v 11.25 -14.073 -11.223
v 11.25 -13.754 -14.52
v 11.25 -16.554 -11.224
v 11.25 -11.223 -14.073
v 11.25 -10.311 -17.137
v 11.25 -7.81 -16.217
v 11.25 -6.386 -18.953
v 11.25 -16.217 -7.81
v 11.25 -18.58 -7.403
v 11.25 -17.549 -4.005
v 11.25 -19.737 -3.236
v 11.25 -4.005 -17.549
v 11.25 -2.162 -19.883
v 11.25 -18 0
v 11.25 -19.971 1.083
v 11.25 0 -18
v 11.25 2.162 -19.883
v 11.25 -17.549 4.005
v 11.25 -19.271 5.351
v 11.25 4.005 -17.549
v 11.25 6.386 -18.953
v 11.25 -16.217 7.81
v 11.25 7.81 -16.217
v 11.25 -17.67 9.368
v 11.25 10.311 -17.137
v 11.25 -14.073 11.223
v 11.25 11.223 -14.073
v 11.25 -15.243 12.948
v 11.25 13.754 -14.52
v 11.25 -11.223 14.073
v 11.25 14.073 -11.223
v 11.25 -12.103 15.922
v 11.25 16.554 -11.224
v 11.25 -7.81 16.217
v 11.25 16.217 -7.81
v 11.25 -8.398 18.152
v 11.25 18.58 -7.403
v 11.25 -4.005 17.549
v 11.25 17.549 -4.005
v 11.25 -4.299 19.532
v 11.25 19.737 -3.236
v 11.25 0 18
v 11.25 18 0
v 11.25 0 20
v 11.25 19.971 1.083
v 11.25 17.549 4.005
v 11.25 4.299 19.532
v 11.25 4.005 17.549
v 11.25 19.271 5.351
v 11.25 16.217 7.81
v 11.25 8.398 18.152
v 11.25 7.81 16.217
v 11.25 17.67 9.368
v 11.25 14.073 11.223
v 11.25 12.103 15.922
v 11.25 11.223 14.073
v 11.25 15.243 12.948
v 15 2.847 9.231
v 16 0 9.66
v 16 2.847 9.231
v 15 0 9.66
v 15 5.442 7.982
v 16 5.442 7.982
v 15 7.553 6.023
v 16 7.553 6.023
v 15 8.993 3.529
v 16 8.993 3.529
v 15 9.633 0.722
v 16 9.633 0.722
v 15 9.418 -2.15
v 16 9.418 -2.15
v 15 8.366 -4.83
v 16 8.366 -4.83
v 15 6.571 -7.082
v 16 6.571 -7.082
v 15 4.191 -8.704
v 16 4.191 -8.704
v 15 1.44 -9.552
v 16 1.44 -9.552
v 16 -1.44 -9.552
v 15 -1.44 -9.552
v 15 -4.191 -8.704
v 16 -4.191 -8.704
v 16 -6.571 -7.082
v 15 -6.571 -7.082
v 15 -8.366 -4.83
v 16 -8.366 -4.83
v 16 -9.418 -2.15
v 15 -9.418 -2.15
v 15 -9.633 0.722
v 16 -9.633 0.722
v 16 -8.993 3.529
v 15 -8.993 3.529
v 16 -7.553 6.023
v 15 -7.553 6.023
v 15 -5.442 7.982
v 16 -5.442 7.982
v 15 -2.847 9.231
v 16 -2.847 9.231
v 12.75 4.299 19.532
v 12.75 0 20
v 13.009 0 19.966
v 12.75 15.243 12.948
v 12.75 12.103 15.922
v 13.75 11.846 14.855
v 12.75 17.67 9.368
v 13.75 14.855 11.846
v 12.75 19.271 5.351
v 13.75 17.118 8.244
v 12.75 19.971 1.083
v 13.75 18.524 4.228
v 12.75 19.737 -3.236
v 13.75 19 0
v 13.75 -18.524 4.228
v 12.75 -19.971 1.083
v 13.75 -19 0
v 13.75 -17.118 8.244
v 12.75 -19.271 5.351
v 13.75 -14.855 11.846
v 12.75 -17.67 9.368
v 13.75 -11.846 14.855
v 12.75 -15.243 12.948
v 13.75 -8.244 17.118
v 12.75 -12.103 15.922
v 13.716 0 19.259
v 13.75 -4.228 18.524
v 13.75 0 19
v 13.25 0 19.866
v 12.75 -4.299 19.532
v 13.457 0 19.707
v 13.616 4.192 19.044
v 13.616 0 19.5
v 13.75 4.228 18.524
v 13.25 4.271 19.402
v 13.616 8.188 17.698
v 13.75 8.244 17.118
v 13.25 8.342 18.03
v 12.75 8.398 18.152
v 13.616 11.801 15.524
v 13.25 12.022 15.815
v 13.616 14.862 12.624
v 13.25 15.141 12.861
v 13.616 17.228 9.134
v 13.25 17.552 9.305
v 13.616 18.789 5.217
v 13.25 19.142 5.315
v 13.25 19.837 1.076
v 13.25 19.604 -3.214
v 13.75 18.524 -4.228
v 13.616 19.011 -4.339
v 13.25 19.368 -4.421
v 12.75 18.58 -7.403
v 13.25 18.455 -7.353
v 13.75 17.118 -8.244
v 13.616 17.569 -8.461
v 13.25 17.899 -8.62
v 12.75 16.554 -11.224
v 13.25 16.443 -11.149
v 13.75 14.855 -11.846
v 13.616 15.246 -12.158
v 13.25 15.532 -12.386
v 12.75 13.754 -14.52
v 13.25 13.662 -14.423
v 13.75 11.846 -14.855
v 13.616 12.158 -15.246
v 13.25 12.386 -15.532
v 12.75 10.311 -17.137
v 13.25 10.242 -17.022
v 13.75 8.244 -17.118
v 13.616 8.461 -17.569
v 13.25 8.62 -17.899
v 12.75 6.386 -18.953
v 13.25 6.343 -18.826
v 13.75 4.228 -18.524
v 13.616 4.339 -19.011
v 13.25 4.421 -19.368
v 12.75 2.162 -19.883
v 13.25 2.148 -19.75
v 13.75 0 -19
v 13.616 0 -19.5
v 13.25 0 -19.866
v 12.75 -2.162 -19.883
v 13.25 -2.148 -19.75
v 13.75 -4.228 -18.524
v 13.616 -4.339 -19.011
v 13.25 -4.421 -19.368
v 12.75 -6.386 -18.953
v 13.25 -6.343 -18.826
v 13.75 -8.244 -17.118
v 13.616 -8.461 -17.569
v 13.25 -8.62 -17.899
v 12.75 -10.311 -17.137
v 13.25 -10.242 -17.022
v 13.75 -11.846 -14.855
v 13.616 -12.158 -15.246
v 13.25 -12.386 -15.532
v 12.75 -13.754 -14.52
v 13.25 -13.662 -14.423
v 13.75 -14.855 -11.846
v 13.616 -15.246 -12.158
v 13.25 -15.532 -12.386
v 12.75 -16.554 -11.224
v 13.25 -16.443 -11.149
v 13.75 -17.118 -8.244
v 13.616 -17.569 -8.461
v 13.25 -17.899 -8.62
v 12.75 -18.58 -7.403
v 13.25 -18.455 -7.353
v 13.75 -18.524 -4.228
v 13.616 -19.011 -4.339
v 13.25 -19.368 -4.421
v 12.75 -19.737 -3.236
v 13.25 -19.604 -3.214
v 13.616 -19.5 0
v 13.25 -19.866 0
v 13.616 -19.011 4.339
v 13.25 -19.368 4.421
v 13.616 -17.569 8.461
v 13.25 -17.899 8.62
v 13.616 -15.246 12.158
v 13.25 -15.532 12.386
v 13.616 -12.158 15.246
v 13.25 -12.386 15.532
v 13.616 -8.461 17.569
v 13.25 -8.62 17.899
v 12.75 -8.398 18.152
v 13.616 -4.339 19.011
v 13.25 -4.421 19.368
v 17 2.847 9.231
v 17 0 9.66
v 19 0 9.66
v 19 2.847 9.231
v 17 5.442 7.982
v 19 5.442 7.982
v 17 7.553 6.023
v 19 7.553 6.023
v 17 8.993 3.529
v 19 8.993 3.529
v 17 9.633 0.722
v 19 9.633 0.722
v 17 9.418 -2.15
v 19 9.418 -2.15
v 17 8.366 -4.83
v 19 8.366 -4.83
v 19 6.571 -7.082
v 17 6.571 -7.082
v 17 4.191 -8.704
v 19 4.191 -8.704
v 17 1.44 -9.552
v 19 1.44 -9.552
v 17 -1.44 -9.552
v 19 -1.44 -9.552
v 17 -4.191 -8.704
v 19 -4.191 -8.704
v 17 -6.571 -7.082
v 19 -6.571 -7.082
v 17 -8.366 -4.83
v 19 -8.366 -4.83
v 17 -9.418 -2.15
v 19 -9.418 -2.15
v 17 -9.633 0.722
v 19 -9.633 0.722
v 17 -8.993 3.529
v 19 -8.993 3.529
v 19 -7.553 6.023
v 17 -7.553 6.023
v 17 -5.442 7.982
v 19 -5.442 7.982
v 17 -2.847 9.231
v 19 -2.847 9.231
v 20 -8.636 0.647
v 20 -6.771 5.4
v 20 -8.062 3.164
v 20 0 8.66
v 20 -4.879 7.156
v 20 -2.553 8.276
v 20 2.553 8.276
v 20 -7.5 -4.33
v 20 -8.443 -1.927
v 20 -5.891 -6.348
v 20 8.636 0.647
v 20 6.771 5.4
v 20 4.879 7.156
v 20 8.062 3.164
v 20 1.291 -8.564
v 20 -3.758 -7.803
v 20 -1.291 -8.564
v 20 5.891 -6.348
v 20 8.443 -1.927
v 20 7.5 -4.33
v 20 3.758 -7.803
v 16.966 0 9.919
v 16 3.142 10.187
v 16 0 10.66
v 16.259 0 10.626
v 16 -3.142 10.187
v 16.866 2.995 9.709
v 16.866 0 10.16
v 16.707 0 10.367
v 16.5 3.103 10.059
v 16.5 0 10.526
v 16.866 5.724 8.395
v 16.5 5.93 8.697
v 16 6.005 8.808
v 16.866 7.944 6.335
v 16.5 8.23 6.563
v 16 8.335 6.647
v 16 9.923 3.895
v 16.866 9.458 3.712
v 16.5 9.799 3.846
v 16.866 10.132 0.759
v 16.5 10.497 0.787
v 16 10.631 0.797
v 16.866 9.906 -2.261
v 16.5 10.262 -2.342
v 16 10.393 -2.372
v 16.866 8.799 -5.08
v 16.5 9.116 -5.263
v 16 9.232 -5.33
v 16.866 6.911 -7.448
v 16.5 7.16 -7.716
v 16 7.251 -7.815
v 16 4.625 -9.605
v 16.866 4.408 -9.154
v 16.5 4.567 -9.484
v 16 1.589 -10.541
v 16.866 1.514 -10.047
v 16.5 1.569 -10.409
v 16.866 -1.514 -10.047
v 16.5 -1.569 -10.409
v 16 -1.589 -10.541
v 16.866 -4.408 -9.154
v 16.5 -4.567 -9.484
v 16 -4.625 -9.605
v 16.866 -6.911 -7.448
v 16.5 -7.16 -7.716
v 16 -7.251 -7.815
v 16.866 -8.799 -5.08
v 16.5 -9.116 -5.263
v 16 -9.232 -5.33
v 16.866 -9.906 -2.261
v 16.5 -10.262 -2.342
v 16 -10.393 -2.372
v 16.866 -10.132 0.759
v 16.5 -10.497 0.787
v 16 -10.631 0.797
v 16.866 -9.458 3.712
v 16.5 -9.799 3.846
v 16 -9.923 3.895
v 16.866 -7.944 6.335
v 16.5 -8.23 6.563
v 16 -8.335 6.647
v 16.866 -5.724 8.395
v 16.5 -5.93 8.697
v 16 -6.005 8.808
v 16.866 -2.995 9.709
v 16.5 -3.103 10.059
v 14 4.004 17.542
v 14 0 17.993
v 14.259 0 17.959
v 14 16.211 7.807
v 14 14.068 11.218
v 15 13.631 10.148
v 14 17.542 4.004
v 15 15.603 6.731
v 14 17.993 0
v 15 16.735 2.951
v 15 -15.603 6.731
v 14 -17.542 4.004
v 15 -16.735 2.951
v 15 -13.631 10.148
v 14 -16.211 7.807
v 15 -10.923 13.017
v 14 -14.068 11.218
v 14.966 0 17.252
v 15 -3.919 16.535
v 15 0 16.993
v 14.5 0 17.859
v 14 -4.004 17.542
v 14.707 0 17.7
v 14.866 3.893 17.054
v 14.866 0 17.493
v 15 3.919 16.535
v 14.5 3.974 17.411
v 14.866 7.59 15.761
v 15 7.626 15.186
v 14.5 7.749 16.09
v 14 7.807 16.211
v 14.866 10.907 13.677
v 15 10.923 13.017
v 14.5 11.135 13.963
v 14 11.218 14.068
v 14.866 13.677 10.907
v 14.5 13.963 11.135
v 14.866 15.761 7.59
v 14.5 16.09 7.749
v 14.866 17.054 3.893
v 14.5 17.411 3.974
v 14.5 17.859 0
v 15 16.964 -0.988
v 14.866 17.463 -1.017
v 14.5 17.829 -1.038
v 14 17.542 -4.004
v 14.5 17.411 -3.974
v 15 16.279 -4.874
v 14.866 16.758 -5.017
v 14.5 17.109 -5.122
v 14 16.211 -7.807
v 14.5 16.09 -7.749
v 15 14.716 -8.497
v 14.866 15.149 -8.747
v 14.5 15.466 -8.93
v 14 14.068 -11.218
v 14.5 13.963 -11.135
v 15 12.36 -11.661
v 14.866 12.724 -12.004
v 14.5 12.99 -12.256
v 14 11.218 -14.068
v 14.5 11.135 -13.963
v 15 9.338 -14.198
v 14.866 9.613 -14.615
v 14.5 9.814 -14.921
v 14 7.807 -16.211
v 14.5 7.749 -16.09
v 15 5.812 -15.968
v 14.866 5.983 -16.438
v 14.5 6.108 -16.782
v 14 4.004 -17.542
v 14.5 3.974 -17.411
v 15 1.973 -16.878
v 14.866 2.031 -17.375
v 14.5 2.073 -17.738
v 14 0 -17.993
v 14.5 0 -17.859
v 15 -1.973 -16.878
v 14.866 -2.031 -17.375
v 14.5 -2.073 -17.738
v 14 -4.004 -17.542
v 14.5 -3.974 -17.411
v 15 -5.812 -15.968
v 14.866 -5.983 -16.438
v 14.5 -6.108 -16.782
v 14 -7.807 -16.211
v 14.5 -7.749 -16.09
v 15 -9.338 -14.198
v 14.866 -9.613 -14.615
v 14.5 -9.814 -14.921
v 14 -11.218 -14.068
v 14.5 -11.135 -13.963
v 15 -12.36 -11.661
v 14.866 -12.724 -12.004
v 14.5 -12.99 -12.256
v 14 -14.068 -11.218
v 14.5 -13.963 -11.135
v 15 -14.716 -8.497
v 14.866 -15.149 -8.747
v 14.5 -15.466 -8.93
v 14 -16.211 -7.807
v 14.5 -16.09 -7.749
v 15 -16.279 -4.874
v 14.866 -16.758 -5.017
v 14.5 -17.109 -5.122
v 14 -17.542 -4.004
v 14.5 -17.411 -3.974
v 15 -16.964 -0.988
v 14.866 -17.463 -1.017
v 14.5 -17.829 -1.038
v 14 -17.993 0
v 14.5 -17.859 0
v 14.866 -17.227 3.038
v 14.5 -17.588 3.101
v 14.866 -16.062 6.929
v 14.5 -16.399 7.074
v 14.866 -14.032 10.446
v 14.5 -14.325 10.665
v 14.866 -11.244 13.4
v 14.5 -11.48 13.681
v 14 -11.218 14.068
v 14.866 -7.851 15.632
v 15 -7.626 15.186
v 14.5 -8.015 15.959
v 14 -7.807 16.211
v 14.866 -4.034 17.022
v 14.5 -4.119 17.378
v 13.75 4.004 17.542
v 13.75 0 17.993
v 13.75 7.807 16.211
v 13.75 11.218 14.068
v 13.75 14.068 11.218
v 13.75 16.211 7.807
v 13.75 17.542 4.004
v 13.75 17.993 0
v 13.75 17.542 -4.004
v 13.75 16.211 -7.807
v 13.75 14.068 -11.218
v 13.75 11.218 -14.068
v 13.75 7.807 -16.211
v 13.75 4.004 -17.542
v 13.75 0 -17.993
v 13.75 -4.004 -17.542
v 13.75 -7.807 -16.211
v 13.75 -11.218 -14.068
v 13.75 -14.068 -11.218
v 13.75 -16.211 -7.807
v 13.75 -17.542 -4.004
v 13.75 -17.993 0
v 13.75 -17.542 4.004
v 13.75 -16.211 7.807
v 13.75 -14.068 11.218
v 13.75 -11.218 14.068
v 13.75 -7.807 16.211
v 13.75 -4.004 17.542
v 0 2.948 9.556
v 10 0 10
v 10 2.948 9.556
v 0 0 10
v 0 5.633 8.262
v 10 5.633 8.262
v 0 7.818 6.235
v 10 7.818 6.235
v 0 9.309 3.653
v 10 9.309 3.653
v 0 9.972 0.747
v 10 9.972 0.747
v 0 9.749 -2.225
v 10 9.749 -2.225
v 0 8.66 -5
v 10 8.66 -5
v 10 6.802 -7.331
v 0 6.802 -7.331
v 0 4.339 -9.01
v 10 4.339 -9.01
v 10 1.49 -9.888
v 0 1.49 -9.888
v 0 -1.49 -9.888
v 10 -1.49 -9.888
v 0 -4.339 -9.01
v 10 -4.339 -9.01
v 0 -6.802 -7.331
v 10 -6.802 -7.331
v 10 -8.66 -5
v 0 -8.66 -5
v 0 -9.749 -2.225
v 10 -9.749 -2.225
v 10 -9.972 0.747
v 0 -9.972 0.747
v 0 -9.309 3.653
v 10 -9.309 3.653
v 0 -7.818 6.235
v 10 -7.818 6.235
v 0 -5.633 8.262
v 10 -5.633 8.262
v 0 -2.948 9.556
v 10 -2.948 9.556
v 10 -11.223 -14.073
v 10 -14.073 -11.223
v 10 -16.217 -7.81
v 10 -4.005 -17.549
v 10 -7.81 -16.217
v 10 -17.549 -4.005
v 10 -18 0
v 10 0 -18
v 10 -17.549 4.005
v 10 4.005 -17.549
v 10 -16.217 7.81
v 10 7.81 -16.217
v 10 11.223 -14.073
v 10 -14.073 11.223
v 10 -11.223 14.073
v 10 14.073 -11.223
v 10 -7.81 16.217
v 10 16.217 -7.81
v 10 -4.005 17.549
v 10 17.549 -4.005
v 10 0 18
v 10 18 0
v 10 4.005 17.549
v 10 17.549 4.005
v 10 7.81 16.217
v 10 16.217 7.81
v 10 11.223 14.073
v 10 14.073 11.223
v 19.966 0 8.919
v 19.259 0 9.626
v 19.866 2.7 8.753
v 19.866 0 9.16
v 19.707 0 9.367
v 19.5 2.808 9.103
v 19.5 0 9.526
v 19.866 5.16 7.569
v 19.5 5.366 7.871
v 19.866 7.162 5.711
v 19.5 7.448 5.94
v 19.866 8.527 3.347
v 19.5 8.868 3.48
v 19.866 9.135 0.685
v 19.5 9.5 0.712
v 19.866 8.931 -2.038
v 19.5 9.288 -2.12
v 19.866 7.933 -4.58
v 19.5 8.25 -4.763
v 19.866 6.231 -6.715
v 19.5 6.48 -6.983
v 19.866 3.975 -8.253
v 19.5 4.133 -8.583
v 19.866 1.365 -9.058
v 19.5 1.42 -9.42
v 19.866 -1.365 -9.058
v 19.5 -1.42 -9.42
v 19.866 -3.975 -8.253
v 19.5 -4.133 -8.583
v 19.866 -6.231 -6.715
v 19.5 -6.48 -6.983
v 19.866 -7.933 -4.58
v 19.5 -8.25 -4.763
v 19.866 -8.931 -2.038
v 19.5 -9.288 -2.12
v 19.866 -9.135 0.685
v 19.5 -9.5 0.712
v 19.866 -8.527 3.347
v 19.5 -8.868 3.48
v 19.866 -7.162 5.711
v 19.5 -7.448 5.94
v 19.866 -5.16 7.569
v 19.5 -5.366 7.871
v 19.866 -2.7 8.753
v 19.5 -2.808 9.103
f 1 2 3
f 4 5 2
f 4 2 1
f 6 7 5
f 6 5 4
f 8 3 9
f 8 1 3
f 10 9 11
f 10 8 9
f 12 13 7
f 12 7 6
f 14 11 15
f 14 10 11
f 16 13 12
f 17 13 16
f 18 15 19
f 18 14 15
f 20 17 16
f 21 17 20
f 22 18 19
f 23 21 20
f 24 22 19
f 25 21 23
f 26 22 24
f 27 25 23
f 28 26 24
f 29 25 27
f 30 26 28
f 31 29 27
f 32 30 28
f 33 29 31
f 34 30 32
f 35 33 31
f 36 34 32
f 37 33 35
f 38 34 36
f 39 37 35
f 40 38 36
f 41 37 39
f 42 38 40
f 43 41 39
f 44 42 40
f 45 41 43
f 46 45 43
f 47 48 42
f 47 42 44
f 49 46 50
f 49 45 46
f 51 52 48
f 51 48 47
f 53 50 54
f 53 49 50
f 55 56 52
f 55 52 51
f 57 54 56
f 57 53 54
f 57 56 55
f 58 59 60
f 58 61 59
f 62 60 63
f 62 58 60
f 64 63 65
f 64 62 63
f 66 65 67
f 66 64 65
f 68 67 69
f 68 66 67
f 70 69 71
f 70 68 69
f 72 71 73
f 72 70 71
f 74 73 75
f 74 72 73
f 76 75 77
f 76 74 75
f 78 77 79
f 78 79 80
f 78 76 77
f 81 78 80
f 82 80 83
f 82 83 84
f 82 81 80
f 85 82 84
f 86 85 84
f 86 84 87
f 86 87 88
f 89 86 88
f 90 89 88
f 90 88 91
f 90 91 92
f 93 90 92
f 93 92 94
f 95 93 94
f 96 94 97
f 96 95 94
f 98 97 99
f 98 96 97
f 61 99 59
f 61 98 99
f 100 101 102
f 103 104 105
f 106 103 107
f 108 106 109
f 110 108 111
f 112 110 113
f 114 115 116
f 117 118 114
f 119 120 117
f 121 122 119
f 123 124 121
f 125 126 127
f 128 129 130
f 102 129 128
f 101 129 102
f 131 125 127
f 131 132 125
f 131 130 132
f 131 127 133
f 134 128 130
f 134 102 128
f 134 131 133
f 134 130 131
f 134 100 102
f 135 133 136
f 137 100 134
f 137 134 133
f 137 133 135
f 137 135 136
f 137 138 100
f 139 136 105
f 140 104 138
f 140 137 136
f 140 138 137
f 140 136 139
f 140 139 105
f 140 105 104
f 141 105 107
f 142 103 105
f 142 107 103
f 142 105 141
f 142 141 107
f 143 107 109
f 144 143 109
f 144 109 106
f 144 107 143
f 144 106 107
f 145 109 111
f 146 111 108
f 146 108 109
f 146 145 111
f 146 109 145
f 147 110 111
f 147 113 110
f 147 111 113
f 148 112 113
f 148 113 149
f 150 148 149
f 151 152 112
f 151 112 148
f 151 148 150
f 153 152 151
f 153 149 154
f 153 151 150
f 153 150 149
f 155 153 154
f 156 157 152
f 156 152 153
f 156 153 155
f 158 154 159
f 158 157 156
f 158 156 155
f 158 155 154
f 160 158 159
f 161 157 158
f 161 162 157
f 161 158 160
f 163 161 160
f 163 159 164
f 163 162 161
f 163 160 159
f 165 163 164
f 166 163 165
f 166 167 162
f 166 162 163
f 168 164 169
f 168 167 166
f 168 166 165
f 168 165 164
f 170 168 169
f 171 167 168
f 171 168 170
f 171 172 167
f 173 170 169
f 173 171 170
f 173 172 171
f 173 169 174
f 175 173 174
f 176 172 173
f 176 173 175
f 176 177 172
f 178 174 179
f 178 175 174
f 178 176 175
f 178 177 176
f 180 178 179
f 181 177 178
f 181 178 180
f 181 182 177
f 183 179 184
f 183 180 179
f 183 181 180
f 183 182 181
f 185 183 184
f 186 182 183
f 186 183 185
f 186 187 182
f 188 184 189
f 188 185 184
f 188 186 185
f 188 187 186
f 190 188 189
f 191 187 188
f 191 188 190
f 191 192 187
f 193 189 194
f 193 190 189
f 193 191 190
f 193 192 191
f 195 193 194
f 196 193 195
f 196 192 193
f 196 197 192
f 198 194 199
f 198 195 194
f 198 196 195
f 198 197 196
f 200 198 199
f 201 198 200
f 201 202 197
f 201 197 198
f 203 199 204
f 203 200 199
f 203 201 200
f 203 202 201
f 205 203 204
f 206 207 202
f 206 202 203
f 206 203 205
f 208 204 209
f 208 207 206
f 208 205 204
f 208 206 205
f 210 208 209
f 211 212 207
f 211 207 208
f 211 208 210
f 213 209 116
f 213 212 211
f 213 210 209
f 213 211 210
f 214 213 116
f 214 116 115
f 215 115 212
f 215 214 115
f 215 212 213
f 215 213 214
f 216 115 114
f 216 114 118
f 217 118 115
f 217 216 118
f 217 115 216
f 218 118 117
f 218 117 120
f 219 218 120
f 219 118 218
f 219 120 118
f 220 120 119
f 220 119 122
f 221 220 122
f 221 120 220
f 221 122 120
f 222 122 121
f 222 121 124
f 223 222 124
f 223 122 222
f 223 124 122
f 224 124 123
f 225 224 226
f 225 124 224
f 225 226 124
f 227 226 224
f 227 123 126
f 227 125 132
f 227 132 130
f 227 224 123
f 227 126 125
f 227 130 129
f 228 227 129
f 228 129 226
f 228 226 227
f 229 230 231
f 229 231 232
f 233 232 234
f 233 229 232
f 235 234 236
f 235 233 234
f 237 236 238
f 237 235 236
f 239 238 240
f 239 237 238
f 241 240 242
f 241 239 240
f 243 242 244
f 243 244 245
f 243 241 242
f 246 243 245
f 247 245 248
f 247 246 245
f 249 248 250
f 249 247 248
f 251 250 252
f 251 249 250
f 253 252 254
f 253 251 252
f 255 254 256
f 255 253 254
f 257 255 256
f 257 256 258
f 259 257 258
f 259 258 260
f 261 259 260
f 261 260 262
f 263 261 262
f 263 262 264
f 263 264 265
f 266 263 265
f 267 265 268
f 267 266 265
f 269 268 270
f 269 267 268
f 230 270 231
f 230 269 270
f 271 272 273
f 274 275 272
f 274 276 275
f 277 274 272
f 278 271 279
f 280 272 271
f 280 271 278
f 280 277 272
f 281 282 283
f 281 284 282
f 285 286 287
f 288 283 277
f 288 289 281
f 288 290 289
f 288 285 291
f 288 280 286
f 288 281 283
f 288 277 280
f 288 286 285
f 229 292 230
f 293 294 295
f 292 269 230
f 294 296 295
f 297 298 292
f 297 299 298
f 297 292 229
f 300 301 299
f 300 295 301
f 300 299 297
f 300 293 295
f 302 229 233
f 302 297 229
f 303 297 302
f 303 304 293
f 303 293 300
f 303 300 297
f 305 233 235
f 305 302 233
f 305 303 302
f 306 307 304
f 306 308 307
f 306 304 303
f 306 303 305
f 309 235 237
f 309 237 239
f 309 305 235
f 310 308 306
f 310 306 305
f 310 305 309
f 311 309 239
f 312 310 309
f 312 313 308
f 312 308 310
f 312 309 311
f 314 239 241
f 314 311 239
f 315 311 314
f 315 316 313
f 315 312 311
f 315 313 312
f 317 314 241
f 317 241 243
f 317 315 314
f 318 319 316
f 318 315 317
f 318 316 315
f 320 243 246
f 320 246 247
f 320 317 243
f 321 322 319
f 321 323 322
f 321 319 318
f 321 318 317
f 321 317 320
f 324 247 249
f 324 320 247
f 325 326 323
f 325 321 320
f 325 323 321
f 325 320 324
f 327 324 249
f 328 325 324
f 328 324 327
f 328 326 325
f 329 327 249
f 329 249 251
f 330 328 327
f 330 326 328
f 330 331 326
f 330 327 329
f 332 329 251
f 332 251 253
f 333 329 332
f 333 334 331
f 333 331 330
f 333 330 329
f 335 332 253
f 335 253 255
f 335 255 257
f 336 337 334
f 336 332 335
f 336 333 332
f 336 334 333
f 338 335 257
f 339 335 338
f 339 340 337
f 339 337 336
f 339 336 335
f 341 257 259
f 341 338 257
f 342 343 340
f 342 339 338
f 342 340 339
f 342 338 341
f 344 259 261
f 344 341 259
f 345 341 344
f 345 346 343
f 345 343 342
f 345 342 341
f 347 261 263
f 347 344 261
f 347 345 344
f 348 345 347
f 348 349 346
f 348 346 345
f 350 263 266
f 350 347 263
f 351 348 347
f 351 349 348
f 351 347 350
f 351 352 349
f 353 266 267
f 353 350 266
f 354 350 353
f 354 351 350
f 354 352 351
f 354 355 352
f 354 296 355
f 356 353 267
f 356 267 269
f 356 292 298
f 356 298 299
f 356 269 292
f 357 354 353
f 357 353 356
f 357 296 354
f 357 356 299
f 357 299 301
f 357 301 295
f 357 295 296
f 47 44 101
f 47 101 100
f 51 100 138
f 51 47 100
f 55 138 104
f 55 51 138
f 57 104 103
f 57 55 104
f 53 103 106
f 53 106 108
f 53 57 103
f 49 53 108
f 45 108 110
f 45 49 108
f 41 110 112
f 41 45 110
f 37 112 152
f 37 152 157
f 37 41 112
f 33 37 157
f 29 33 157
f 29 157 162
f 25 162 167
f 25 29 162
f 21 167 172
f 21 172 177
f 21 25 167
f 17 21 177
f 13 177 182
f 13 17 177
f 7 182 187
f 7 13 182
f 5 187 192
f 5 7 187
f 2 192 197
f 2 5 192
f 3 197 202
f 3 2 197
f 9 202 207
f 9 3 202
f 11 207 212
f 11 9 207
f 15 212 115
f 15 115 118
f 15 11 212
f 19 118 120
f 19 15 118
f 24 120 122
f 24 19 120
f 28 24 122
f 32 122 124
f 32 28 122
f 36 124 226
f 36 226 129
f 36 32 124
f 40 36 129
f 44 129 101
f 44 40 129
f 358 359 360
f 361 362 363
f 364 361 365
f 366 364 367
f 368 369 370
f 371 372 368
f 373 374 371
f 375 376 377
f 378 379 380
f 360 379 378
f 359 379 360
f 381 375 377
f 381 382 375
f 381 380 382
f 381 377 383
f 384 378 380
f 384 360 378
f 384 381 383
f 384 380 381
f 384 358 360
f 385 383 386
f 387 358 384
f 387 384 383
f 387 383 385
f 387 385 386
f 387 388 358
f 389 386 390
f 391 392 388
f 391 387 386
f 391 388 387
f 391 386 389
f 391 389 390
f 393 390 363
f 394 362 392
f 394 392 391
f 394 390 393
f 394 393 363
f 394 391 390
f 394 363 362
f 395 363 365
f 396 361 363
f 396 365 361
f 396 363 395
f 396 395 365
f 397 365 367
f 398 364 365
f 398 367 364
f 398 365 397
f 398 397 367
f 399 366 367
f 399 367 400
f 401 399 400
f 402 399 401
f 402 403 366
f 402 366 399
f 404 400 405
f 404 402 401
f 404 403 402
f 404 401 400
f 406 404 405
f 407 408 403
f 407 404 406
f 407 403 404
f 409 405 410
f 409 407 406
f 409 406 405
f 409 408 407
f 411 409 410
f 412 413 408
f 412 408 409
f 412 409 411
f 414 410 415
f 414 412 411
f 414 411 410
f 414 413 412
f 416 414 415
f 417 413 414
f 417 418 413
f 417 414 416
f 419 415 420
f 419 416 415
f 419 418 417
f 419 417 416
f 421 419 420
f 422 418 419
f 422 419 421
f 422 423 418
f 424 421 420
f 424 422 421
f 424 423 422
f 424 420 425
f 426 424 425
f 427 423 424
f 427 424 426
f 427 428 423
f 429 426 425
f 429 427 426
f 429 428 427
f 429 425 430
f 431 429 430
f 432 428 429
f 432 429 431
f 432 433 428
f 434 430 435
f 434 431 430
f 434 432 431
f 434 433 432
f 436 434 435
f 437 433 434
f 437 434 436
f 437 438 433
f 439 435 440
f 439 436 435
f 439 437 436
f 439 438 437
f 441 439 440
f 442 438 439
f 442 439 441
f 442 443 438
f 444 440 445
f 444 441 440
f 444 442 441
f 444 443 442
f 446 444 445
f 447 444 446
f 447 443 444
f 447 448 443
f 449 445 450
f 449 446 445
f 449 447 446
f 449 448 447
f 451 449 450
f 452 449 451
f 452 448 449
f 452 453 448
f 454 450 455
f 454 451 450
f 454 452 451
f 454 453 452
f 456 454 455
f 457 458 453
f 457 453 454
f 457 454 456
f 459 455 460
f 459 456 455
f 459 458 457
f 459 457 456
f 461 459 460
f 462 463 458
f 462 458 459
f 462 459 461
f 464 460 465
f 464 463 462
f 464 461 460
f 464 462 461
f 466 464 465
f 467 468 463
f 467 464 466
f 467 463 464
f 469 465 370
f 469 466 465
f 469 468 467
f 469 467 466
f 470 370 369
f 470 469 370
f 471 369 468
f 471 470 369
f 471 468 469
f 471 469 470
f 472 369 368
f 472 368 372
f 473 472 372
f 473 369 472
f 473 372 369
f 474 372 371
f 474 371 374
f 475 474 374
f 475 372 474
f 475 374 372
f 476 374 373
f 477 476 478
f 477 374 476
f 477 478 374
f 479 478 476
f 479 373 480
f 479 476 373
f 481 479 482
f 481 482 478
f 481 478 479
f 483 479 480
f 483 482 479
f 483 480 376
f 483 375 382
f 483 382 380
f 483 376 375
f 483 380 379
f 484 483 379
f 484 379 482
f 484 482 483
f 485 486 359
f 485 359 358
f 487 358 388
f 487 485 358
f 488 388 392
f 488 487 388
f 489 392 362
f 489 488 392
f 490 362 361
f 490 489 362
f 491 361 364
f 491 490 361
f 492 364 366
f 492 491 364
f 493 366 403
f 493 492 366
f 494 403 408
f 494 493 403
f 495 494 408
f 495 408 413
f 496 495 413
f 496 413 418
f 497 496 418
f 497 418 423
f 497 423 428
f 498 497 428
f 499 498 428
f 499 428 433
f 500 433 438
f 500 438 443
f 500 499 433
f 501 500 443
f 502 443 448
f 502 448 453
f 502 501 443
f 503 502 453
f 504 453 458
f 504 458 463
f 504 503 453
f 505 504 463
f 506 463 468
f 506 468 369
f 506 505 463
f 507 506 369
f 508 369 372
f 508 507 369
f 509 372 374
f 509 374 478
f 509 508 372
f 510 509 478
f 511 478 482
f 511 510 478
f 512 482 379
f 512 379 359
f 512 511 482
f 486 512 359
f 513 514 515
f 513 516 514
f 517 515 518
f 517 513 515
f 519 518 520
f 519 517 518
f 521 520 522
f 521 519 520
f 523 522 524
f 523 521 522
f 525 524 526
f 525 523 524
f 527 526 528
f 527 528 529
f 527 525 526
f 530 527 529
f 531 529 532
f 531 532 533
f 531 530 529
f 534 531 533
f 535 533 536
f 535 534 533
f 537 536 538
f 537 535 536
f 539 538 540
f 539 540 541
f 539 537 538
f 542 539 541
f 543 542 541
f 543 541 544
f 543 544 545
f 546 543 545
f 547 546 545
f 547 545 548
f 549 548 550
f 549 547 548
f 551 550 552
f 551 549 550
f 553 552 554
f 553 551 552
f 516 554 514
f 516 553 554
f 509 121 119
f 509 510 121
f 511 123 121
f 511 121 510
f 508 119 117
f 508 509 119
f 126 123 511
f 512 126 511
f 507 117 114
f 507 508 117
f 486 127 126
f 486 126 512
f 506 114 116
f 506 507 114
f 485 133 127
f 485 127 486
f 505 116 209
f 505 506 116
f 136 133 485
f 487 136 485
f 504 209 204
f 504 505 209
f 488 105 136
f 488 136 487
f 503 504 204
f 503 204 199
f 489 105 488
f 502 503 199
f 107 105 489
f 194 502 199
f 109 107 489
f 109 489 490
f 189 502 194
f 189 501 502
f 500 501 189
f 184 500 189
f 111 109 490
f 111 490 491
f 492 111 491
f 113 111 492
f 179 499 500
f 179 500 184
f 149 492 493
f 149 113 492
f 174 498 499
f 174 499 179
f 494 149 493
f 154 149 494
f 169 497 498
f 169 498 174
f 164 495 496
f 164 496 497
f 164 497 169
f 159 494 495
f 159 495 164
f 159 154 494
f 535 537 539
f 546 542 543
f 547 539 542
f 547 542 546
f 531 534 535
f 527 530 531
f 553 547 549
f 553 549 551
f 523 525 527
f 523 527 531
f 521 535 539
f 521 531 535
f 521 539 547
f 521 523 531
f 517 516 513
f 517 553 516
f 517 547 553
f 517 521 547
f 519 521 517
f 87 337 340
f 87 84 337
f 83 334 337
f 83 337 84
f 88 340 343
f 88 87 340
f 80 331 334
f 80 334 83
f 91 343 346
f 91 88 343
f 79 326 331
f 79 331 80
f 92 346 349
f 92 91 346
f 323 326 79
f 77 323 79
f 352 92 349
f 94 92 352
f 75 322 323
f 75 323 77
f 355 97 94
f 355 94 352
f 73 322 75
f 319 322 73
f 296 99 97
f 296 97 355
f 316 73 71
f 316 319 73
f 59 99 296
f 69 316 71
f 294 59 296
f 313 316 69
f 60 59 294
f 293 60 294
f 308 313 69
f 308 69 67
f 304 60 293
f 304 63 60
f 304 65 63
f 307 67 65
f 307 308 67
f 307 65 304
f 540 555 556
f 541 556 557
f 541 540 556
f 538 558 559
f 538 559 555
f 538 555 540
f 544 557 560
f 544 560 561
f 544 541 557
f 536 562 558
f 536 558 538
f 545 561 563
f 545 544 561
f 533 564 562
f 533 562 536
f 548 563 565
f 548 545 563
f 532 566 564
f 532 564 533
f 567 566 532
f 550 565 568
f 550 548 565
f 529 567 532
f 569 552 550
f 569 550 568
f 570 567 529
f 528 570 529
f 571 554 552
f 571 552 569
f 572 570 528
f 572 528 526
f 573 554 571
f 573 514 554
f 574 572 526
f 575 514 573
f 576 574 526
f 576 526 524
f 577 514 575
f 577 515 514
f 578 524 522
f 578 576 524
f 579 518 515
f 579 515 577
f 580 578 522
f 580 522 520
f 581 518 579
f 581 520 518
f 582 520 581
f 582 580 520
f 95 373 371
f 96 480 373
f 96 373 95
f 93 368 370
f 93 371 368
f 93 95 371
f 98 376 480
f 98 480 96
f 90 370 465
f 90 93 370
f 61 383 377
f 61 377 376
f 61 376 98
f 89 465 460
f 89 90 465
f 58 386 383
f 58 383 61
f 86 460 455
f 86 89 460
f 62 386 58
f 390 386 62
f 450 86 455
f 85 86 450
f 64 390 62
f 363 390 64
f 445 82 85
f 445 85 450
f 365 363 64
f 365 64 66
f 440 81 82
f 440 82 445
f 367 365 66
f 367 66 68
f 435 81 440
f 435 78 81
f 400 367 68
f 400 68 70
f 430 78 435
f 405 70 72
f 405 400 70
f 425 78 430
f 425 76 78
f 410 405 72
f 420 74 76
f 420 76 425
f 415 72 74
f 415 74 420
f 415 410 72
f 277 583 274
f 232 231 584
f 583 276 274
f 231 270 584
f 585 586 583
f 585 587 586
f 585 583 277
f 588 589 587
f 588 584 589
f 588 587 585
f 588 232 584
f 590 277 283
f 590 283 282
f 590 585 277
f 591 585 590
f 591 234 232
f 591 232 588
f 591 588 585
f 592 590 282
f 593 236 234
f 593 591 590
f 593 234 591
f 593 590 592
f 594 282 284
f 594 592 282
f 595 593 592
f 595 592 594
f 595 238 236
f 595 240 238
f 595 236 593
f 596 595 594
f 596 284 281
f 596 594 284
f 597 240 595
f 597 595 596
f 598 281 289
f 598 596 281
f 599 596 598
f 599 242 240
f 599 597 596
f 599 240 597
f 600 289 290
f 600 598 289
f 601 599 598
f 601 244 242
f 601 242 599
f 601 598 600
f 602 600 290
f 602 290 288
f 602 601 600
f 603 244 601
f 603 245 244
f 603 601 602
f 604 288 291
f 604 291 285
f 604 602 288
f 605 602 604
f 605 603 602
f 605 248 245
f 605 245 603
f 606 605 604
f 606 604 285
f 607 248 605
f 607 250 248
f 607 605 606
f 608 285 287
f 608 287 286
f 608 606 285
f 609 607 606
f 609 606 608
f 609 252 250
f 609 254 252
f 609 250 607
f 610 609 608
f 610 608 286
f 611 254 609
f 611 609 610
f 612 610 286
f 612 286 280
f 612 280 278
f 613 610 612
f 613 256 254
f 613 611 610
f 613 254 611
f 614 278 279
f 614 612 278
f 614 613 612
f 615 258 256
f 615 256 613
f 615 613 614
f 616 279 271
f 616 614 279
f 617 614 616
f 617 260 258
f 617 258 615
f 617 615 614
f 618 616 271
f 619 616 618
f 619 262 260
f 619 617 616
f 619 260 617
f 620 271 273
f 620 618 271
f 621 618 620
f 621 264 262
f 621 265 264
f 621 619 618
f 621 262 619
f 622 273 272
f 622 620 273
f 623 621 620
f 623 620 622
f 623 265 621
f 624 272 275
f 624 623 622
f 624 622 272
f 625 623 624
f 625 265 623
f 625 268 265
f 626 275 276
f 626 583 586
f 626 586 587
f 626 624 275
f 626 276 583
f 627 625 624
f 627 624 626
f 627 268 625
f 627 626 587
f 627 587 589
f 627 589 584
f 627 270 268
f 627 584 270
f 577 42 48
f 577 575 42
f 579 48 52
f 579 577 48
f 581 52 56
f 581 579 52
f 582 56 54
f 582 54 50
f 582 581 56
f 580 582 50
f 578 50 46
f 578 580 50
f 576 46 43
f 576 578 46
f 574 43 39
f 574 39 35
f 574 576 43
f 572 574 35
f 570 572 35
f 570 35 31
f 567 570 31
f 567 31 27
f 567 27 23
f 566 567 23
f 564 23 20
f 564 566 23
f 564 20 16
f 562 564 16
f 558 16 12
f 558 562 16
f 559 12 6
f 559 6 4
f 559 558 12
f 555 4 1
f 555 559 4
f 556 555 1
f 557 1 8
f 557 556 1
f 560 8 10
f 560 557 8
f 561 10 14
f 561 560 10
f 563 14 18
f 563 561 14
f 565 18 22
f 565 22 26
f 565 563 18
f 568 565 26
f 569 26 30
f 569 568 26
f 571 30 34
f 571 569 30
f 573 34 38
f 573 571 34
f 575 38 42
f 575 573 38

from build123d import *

# Parameters (mm, degrees)
F2_R = 0.99999


# Not quite as in the source:
# - a fillet or chamfer is up to 0.001 mm smaller than in the source, because OpenCascade refuses the exact size


with BuildPart() as f1:
    # F0 (on Front) → F1 (revolve)
    with BuildSketch(Plane.XZ):
        Polygon((0, 10), (0, 0), (20, 0), (20, 9.6603445709), (17, 9.6603445709), (17, 10.6603445709), (16, 10.6603445709), (16, 9.6603445709), (15, 9.6603445709), (15, 17.993060872), (13.75, 17.993060872), (13.75, 20), (11.25, 20), (11.25, 18), (10, 18), (10, 10), align=None)
    revolve(axis=Axis((10, 0, 0), (-1, 0, 0)))

    # F2 (radius 1 in the source; OpenCascade refuses exactly that, so slightly less here)
    f2_edges = [f1.edges().sort_by_distance(p)[0] for p in [
        (20, 0, -9.660345),
        (17, 0, -10.660345),
        (15, 0, -17.993061),
        (13.75, 0, -20),
    ]]
    fillet(f2_edges, radius=F2_R)


solid = f1.part
